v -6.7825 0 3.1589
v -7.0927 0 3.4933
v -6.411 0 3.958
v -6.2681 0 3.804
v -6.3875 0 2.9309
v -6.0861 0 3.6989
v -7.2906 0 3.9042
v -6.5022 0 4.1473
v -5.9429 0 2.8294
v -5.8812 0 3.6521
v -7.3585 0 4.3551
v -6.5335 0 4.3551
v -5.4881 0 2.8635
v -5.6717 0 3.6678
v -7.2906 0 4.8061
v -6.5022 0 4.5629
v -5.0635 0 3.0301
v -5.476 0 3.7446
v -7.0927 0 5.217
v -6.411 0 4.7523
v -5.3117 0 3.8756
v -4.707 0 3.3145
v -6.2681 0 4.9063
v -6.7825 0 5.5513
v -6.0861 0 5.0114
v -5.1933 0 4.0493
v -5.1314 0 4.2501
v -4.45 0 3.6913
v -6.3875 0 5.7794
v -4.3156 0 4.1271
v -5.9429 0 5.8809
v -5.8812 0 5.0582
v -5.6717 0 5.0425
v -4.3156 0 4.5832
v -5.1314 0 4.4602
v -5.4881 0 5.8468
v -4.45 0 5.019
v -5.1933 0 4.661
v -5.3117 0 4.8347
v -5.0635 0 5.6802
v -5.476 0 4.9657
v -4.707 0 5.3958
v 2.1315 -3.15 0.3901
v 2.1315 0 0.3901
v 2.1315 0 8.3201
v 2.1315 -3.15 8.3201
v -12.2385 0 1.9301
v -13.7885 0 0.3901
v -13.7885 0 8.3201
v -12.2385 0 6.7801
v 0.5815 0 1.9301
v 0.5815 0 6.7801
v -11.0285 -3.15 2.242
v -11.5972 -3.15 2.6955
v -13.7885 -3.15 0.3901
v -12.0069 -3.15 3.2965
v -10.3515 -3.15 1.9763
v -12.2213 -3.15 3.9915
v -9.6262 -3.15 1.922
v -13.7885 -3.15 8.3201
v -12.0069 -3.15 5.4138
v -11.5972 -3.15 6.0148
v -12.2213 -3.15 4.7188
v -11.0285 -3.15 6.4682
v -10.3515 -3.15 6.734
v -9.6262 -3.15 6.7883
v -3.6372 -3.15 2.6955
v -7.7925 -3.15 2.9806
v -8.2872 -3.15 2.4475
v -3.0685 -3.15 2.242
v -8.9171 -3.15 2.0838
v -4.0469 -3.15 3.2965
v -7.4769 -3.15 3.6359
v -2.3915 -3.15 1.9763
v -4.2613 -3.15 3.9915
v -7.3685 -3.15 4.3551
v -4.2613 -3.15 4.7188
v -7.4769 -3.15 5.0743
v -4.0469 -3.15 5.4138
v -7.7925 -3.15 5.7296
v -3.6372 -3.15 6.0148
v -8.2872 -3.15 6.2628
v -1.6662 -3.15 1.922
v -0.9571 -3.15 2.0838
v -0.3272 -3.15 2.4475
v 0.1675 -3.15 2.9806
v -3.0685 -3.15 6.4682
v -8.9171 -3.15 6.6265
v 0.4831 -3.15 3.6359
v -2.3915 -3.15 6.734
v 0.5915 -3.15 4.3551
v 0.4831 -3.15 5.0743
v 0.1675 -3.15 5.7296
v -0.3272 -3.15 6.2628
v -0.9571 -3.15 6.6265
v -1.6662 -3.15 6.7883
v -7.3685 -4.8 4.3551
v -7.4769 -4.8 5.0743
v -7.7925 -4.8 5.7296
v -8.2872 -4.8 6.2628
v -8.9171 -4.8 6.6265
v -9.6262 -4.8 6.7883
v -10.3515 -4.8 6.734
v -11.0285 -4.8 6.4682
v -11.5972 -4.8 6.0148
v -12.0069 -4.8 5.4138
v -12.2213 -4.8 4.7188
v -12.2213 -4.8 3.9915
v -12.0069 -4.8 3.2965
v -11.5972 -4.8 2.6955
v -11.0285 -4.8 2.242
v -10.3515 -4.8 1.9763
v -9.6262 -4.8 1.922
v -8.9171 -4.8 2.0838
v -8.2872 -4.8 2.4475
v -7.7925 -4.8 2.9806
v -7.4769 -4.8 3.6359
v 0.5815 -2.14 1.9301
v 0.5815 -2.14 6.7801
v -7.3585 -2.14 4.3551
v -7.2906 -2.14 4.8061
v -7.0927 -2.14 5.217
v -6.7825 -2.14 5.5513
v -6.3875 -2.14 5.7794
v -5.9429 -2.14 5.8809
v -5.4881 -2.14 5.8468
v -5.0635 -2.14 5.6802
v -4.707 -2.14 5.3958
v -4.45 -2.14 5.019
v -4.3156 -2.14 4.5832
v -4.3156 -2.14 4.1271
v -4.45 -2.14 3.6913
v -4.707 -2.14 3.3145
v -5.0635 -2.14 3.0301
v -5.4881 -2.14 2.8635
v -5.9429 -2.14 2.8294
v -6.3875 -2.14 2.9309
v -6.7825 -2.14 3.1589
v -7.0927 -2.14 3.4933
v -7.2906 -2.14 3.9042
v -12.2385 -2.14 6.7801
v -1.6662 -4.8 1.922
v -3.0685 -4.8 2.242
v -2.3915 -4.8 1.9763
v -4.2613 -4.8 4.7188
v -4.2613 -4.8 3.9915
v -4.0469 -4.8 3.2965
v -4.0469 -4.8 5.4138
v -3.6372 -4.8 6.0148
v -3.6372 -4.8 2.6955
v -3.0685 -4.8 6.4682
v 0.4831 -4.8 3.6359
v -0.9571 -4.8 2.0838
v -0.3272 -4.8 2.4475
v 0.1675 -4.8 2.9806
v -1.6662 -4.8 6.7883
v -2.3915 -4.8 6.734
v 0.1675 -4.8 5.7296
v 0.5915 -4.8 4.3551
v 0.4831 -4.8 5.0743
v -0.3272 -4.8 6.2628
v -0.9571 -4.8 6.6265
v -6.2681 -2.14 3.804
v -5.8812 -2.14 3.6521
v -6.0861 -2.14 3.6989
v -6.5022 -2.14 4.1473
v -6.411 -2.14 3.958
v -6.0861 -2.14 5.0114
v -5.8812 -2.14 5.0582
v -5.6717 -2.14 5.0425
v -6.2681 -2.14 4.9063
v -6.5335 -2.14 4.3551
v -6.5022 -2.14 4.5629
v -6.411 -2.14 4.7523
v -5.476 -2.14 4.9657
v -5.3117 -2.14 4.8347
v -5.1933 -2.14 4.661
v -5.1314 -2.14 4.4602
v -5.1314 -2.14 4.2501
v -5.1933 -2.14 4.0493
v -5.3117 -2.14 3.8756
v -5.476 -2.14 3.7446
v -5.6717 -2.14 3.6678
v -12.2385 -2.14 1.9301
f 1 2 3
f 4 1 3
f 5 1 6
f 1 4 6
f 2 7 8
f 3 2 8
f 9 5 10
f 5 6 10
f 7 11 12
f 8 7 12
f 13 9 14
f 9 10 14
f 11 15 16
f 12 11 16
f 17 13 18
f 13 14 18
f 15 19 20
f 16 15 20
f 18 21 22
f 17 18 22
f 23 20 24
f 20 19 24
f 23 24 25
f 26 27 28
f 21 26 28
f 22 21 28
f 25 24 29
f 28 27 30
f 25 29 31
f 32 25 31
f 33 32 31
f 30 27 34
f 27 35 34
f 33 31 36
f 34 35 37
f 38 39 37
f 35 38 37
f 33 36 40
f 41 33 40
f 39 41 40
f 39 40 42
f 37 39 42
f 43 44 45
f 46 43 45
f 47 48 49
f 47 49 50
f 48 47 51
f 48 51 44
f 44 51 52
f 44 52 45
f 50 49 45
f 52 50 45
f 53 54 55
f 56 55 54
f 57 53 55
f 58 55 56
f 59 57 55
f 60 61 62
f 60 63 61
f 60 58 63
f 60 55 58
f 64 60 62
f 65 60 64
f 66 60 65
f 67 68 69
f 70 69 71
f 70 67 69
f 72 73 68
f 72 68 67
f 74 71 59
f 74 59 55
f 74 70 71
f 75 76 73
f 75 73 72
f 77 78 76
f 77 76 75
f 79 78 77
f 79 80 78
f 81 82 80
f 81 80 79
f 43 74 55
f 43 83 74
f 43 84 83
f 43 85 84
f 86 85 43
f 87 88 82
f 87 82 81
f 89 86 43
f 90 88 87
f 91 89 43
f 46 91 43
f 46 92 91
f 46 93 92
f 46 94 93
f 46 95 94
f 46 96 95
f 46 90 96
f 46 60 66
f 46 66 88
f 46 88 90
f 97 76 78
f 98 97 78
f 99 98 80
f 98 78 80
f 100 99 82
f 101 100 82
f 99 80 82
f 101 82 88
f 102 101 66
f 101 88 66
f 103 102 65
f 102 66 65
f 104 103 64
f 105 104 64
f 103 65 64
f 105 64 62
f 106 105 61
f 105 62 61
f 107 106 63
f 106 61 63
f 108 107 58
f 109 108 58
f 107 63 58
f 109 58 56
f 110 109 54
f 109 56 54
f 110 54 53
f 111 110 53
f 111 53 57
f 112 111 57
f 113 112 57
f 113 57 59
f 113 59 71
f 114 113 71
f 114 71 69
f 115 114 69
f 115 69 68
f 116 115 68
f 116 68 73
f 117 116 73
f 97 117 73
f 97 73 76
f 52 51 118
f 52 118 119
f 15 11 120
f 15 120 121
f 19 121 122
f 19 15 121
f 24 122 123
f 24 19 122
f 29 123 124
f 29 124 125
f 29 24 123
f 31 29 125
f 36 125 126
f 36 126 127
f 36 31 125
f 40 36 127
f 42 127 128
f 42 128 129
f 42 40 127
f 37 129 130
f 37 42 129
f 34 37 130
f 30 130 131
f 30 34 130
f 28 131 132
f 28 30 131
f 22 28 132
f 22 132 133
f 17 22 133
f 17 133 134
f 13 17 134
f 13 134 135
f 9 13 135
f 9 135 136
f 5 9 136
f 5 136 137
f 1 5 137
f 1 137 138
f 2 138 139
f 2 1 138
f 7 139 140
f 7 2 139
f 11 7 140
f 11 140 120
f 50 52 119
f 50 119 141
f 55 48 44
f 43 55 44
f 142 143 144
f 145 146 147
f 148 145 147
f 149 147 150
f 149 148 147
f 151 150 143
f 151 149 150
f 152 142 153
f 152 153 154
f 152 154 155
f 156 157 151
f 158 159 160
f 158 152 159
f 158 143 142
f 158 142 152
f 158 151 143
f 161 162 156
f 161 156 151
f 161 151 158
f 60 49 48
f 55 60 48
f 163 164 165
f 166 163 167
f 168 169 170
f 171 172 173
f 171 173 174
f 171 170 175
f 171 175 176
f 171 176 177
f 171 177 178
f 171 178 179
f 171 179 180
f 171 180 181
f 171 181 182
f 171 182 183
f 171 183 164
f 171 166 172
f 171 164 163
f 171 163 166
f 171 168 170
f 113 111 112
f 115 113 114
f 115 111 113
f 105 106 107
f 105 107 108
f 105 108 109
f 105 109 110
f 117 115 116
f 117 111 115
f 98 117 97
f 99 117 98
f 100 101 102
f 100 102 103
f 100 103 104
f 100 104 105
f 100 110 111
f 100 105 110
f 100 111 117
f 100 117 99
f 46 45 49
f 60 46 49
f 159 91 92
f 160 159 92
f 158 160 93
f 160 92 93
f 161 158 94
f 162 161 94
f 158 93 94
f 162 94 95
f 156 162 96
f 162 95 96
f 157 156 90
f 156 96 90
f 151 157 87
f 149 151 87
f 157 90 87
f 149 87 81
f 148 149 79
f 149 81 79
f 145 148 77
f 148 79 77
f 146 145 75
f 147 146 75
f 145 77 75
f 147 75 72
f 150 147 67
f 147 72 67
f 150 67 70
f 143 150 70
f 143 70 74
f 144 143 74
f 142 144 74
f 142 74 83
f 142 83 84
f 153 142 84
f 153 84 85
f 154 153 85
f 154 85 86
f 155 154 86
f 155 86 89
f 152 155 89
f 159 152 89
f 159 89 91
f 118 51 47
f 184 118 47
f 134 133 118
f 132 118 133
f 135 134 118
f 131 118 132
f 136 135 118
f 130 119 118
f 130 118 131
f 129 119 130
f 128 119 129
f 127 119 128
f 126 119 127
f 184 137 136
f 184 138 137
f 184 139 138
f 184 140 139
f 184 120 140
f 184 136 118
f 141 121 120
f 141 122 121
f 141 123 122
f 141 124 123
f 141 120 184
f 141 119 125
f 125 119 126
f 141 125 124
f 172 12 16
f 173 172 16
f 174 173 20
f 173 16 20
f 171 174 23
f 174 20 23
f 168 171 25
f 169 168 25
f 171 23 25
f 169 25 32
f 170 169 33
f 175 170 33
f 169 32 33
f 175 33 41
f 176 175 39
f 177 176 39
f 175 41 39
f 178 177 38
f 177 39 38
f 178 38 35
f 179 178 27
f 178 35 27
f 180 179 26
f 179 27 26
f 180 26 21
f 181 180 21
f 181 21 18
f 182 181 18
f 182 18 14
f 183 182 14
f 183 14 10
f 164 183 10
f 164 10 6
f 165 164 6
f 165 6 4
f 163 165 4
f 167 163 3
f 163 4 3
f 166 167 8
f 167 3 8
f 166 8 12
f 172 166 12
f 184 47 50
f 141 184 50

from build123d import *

# Parameters (mm, degrees)
F0_R     = 2.44
F1_DEPTH = 3.15
F2_DEPTH = 4.8
F3_W     = 12.82
F3_H     = 4.85
F3_R     = 1.53
F3_R_2   = 0.705
F4_DEPTH = 2.14


with BuildPart() as f1:
    # F0 (on Front) → F1 (new body)
    with BuildSketch(Plane.XZ):
        Polygon((2.131469, 8.320145), (-13.788531, 8.320145), (-13.788531, 0.390145), (-10.388192, 0.390145), (-7.928192, 0.390145), (-3.748192, 0.390145), (-1.288192, 0.390145), (2.131469, 0.390145), align=None)
        with Locations((-9.808531, 4.355145)):
            Circle(F0_R, mode=Mode.SUBTRACT)
        with Locations((-1.848531, 4.355145)):
            Circle(F0_R, mode=Mode.SUBTRACT)
    extrude(amount=F1_DEPTH)

    # F0 (on Front) → F2 (join)
    with BuildSketch(Plane.XZ):
        with Locations((-9.808531, 4.355145)):
            Circle(F0_R)
        with Locations((-1.848531, 4.355145)):
            Circle(F0_R)
    extrude(amount=F2_DEPTH)

    # F3 (on face) → F4 (cut)
    with BuildSketch(Plane(origin=(0, 0, 0), x_dir=(-1, 0, 0), z_dir=(0, 1, 0))):
        with Locations((5.828531, 4.355145)):
            Rectangle(F3_W, F3_H)
        with Locations((5.828531, 4.355145)):
            Circle(F3_R, mode=Mode.SUBTRACT)
        with Locations((5.828531, 4.355145)):
            Circle(F3_R_2)
    extrude(amount=-F4_DEPTH, mode=Mode.SUBTRACT)


solid = f1.part
